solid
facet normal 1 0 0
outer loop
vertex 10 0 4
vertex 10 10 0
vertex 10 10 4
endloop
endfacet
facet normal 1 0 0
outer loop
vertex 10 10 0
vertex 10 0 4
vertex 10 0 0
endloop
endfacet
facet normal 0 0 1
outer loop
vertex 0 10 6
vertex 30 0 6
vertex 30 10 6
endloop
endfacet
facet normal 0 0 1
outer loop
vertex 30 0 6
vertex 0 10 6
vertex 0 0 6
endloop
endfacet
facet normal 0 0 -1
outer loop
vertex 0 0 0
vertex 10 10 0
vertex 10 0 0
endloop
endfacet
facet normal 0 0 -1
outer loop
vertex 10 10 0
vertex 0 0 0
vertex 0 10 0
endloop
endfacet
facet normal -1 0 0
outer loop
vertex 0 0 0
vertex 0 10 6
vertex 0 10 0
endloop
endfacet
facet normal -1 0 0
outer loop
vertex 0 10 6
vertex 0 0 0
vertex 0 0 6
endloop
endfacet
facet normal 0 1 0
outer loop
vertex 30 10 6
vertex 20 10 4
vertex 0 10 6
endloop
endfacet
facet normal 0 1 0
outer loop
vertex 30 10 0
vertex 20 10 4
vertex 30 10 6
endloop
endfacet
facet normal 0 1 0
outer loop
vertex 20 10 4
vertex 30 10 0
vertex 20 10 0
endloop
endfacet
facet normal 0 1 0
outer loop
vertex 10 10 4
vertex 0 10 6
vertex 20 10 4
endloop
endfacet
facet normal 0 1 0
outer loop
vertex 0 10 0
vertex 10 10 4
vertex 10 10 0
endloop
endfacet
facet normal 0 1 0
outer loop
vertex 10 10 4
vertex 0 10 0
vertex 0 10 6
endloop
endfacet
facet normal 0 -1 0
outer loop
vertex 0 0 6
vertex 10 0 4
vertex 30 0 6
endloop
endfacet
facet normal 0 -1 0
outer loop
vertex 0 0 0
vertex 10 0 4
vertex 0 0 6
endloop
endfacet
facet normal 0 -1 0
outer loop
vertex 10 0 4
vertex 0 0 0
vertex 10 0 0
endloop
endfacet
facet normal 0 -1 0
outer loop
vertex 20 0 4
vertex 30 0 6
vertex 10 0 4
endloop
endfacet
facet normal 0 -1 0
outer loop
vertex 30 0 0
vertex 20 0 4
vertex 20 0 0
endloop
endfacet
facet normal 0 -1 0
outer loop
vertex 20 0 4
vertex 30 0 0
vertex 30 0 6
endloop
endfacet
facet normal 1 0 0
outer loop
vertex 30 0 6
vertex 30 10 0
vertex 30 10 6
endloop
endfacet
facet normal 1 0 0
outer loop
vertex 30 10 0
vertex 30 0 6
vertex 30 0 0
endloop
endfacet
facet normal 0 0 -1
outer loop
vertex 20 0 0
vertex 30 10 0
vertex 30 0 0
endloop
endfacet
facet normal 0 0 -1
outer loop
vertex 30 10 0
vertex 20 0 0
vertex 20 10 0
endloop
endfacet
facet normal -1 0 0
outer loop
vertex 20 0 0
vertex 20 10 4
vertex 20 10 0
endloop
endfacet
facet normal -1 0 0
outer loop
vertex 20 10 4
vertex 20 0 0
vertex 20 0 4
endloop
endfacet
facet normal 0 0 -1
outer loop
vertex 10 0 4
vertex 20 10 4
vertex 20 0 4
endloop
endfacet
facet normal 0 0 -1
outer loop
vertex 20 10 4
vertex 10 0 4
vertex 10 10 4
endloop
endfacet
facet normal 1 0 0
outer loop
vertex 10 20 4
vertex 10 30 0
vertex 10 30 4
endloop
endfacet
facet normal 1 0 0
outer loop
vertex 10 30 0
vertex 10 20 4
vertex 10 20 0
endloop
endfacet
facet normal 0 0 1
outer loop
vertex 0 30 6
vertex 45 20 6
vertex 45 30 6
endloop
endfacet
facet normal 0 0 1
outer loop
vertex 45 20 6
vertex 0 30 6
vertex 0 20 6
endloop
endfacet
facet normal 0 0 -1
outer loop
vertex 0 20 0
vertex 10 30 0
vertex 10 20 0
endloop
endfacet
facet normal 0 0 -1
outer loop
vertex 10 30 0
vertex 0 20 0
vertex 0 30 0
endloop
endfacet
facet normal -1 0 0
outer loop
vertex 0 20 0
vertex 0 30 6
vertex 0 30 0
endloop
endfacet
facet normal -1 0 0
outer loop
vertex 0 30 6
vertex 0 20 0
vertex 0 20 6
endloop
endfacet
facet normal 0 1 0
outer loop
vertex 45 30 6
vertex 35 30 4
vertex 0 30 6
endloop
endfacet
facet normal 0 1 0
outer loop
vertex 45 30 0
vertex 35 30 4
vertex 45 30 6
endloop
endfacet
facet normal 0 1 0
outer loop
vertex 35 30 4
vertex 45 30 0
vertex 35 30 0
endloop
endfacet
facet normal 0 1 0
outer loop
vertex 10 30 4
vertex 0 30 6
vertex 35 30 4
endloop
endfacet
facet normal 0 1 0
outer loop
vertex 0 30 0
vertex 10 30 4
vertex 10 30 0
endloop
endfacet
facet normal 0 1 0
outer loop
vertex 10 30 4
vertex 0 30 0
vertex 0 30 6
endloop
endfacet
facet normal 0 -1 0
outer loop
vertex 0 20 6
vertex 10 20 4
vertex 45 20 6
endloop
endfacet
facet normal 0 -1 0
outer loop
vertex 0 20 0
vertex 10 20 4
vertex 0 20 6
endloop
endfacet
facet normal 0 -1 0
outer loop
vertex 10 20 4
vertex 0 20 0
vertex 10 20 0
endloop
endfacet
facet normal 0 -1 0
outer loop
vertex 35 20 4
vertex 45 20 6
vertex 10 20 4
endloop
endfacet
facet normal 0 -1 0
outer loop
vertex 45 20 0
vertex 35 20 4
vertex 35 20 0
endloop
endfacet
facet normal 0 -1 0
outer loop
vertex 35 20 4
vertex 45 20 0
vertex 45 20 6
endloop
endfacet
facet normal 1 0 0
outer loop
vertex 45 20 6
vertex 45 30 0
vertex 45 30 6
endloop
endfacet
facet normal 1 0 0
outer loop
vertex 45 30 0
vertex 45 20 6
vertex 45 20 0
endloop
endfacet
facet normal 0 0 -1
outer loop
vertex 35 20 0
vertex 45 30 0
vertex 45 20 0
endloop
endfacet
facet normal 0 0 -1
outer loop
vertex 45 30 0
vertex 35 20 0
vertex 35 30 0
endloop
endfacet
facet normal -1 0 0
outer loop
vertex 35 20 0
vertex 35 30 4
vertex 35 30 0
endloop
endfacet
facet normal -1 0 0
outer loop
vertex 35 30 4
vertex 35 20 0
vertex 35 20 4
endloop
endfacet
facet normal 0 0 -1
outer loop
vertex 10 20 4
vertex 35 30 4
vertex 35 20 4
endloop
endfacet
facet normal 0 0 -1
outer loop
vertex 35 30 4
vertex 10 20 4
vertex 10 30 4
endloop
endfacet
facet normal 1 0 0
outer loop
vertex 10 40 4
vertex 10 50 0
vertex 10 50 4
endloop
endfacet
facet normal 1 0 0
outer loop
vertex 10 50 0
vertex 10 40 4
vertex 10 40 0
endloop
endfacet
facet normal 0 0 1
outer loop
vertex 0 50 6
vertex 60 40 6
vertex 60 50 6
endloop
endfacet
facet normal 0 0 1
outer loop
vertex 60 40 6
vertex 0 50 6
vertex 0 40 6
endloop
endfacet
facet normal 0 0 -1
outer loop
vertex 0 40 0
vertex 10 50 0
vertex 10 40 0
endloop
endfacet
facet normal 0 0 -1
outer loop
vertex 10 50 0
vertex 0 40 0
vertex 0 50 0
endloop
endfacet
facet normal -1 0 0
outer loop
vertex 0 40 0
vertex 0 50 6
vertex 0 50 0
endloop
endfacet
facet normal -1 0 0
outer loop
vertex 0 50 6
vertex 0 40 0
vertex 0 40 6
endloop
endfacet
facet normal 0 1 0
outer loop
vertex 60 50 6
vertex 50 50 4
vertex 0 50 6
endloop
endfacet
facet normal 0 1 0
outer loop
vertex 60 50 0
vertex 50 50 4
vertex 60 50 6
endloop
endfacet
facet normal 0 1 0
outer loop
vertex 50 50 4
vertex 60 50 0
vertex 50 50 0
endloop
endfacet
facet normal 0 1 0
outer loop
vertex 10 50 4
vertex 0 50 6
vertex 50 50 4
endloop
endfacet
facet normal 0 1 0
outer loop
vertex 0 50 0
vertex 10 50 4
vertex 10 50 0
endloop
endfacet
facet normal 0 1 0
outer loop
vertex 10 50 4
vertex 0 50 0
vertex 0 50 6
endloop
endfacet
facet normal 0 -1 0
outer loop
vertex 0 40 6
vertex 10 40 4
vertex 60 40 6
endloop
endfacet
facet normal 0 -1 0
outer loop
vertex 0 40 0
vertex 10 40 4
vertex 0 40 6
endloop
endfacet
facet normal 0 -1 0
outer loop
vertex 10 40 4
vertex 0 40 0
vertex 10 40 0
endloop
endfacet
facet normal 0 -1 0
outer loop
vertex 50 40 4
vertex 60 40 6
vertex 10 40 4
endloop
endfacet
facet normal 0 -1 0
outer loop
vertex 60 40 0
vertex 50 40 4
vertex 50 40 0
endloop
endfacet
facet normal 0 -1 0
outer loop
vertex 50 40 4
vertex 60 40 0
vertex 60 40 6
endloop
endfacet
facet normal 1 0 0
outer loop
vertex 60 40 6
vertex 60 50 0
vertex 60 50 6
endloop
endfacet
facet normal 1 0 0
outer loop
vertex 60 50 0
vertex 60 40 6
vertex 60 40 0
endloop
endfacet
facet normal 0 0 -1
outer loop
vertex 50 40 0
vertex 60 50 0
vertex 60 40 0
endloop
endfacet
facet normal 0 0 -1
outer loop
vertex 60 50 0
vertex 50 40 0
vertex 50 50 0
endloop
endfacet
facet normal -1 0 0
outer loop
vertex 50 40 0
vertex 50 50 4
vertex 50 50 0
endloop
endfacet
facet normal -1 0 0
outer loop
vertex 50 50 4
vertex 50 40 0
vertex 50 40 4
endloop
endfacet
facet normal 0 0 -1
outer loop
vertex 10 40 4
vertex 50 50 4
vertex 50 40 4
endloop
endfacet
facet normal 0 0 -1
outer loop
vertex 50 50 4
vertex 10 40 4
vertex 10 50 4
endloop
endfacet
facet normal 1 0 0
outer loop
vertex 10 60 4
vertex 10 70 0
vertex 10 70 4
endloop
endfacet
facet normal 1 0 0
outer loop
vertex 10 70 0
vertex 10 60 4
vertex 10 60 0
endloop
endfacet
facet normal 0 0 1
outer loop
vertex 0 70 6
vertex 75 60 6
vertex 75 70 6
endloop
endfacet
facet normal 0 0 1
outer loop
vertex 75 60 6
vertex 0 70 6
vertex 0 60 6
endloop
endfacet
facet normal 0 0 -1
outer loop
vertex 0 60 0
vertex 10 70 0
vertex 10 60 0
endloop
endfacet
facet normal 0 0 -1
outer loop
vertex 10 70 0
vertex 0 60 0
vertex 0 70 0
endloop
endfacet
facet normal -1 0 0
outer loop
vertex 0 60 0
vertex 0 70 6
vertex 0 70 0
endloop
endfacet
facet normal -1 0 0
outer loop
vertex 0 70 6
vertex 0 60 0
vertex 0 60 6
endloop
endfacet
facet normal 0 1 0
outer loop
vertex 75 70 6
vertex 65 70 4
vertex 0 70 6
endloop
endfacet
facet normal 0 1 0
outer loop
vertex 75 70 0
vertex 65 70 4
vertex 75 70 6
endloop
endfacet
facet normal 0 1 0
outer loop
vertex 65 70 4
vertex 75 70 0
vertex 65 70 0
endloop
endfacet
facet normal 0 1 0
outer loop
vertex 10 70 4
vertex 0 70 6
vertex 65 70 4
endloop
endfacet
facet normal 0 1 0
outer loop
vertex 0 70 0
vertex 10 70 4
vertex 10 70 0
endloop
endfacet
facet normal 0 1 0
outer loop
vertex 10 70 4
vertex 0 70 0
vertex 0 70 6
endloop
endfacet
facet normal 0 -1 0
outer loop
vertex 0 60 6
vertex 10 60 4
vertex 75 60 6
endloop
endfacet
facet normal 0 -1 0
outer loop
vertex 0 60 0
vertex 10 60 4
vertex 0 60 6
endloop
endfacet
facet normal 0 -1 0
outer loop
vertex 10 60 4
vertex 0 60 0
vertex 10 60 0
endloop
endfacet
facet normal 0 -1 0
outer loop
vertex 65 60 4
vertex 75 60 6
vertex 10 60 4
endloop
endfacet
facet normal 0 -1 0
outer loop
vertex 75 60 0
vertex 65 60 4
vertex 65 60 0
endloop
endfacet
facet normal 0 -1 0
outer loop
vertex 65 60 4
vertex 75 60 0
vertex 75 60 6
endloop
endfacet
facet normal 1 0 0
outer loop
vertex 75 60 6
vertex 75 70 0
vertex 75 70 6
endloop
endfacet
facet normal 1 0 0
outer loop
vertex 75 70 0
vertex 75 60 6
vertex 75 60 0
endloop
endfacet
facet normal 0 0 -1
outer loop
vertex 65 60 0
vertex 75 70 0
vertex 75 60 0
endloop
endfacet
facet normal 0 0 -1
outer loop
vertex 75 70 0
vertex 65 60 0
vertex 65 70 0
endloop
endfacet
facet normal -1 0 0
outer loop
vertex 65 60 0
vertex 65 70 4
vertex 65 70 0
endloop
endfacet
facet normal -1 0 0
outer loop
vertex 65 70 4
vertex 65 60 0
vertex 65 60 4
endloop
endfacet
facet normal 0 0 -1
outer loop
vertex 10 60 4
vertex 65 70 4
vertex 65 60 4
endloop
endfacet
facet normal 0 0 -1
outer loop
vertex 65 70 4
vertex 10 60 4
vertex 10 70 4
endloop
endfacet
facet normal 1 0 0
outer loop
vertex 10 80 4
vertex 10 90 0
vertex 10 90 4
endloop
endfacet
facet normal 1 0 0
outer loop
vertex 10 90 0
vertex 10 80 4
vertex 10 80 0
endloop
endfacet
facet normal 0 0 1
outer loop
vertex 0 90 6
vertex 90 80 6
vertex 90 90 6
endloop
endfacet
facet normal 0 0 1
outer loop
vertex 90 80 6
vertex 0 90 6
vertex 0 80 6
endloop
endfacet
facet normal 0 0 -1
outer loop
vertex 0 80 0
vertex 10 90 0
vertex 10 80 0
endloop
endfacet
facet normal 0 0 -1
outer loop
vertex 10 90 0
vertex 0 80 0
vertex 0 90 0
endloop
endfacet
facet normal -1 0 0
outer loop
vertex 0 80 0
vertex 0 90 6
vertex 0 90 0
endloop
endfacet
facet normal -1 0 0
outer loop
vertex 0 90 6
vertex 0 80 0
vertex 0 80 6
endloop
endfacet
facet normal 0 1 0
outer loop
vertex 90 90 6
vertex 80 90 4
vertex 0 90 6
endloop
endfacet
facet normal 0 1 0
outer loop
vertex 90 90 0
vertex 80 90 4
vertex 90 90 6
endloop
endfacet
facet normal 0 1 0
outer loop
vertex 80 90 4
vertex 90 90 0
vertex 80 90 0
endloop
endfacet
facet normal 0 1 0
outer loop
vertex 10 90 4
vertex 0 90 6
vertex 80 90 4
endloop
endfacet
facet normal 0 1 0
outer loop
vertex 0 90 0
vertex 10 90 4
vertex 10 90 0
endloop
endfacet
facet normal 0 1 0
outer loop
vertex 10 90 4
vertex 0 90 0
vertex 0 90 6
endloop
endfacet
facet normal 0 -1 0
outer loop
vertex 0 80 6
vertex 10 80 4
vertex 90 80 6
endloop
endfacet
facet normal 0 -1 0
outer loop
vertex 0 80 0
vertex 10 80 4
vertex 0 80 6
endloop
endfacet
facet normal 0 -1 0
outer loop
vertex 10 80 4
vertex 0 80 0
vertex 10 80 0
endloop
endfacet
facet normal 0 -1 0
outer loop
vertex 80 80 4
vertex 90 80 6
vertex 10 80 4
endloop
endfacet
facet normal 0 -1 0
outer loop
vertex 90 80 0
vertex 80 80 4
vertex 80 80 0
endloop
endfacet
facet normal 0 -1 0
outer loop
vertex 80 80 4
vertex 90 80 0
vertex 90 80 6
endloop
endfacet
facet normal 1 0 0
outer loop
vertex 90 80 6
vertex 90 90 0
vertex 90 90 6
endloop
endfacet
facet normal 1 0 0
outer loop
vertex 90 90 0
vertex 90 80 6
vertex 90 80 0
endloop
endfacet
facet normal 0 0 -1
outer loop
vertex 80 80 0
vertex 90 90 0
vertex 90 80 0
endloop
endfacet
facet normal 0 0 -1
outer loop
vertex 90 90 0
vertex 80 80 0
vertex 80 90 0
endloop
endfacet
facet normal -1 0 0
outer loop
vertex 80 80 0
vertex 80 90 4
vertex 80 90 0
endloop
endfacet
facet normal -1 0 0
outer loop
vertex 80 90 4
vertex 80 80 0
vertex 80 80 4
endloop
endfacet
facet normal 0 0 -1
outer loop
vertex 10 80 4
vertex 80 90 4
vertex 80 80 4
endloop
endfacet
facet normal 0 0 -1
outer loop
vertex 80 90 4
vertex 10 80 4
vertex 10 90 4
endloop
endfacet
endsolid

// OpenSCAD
With=10;
Height=6;
Thickness=2;
Number=5;
//First bridge length
First_length=10;
//Increment between each bridge
Increment=15;


for(i=[0:Number-1])
{
	translate([0,i*(With+10),0])cube([With,With,Height]);
	translate([With+First_length+i*Increment,i*(With+10),0])cube([With,With,Height]);
	translate([With,i*(With+10),Height-Thickness])cube([First_length+i*Increment,With,Thickness]);
}
